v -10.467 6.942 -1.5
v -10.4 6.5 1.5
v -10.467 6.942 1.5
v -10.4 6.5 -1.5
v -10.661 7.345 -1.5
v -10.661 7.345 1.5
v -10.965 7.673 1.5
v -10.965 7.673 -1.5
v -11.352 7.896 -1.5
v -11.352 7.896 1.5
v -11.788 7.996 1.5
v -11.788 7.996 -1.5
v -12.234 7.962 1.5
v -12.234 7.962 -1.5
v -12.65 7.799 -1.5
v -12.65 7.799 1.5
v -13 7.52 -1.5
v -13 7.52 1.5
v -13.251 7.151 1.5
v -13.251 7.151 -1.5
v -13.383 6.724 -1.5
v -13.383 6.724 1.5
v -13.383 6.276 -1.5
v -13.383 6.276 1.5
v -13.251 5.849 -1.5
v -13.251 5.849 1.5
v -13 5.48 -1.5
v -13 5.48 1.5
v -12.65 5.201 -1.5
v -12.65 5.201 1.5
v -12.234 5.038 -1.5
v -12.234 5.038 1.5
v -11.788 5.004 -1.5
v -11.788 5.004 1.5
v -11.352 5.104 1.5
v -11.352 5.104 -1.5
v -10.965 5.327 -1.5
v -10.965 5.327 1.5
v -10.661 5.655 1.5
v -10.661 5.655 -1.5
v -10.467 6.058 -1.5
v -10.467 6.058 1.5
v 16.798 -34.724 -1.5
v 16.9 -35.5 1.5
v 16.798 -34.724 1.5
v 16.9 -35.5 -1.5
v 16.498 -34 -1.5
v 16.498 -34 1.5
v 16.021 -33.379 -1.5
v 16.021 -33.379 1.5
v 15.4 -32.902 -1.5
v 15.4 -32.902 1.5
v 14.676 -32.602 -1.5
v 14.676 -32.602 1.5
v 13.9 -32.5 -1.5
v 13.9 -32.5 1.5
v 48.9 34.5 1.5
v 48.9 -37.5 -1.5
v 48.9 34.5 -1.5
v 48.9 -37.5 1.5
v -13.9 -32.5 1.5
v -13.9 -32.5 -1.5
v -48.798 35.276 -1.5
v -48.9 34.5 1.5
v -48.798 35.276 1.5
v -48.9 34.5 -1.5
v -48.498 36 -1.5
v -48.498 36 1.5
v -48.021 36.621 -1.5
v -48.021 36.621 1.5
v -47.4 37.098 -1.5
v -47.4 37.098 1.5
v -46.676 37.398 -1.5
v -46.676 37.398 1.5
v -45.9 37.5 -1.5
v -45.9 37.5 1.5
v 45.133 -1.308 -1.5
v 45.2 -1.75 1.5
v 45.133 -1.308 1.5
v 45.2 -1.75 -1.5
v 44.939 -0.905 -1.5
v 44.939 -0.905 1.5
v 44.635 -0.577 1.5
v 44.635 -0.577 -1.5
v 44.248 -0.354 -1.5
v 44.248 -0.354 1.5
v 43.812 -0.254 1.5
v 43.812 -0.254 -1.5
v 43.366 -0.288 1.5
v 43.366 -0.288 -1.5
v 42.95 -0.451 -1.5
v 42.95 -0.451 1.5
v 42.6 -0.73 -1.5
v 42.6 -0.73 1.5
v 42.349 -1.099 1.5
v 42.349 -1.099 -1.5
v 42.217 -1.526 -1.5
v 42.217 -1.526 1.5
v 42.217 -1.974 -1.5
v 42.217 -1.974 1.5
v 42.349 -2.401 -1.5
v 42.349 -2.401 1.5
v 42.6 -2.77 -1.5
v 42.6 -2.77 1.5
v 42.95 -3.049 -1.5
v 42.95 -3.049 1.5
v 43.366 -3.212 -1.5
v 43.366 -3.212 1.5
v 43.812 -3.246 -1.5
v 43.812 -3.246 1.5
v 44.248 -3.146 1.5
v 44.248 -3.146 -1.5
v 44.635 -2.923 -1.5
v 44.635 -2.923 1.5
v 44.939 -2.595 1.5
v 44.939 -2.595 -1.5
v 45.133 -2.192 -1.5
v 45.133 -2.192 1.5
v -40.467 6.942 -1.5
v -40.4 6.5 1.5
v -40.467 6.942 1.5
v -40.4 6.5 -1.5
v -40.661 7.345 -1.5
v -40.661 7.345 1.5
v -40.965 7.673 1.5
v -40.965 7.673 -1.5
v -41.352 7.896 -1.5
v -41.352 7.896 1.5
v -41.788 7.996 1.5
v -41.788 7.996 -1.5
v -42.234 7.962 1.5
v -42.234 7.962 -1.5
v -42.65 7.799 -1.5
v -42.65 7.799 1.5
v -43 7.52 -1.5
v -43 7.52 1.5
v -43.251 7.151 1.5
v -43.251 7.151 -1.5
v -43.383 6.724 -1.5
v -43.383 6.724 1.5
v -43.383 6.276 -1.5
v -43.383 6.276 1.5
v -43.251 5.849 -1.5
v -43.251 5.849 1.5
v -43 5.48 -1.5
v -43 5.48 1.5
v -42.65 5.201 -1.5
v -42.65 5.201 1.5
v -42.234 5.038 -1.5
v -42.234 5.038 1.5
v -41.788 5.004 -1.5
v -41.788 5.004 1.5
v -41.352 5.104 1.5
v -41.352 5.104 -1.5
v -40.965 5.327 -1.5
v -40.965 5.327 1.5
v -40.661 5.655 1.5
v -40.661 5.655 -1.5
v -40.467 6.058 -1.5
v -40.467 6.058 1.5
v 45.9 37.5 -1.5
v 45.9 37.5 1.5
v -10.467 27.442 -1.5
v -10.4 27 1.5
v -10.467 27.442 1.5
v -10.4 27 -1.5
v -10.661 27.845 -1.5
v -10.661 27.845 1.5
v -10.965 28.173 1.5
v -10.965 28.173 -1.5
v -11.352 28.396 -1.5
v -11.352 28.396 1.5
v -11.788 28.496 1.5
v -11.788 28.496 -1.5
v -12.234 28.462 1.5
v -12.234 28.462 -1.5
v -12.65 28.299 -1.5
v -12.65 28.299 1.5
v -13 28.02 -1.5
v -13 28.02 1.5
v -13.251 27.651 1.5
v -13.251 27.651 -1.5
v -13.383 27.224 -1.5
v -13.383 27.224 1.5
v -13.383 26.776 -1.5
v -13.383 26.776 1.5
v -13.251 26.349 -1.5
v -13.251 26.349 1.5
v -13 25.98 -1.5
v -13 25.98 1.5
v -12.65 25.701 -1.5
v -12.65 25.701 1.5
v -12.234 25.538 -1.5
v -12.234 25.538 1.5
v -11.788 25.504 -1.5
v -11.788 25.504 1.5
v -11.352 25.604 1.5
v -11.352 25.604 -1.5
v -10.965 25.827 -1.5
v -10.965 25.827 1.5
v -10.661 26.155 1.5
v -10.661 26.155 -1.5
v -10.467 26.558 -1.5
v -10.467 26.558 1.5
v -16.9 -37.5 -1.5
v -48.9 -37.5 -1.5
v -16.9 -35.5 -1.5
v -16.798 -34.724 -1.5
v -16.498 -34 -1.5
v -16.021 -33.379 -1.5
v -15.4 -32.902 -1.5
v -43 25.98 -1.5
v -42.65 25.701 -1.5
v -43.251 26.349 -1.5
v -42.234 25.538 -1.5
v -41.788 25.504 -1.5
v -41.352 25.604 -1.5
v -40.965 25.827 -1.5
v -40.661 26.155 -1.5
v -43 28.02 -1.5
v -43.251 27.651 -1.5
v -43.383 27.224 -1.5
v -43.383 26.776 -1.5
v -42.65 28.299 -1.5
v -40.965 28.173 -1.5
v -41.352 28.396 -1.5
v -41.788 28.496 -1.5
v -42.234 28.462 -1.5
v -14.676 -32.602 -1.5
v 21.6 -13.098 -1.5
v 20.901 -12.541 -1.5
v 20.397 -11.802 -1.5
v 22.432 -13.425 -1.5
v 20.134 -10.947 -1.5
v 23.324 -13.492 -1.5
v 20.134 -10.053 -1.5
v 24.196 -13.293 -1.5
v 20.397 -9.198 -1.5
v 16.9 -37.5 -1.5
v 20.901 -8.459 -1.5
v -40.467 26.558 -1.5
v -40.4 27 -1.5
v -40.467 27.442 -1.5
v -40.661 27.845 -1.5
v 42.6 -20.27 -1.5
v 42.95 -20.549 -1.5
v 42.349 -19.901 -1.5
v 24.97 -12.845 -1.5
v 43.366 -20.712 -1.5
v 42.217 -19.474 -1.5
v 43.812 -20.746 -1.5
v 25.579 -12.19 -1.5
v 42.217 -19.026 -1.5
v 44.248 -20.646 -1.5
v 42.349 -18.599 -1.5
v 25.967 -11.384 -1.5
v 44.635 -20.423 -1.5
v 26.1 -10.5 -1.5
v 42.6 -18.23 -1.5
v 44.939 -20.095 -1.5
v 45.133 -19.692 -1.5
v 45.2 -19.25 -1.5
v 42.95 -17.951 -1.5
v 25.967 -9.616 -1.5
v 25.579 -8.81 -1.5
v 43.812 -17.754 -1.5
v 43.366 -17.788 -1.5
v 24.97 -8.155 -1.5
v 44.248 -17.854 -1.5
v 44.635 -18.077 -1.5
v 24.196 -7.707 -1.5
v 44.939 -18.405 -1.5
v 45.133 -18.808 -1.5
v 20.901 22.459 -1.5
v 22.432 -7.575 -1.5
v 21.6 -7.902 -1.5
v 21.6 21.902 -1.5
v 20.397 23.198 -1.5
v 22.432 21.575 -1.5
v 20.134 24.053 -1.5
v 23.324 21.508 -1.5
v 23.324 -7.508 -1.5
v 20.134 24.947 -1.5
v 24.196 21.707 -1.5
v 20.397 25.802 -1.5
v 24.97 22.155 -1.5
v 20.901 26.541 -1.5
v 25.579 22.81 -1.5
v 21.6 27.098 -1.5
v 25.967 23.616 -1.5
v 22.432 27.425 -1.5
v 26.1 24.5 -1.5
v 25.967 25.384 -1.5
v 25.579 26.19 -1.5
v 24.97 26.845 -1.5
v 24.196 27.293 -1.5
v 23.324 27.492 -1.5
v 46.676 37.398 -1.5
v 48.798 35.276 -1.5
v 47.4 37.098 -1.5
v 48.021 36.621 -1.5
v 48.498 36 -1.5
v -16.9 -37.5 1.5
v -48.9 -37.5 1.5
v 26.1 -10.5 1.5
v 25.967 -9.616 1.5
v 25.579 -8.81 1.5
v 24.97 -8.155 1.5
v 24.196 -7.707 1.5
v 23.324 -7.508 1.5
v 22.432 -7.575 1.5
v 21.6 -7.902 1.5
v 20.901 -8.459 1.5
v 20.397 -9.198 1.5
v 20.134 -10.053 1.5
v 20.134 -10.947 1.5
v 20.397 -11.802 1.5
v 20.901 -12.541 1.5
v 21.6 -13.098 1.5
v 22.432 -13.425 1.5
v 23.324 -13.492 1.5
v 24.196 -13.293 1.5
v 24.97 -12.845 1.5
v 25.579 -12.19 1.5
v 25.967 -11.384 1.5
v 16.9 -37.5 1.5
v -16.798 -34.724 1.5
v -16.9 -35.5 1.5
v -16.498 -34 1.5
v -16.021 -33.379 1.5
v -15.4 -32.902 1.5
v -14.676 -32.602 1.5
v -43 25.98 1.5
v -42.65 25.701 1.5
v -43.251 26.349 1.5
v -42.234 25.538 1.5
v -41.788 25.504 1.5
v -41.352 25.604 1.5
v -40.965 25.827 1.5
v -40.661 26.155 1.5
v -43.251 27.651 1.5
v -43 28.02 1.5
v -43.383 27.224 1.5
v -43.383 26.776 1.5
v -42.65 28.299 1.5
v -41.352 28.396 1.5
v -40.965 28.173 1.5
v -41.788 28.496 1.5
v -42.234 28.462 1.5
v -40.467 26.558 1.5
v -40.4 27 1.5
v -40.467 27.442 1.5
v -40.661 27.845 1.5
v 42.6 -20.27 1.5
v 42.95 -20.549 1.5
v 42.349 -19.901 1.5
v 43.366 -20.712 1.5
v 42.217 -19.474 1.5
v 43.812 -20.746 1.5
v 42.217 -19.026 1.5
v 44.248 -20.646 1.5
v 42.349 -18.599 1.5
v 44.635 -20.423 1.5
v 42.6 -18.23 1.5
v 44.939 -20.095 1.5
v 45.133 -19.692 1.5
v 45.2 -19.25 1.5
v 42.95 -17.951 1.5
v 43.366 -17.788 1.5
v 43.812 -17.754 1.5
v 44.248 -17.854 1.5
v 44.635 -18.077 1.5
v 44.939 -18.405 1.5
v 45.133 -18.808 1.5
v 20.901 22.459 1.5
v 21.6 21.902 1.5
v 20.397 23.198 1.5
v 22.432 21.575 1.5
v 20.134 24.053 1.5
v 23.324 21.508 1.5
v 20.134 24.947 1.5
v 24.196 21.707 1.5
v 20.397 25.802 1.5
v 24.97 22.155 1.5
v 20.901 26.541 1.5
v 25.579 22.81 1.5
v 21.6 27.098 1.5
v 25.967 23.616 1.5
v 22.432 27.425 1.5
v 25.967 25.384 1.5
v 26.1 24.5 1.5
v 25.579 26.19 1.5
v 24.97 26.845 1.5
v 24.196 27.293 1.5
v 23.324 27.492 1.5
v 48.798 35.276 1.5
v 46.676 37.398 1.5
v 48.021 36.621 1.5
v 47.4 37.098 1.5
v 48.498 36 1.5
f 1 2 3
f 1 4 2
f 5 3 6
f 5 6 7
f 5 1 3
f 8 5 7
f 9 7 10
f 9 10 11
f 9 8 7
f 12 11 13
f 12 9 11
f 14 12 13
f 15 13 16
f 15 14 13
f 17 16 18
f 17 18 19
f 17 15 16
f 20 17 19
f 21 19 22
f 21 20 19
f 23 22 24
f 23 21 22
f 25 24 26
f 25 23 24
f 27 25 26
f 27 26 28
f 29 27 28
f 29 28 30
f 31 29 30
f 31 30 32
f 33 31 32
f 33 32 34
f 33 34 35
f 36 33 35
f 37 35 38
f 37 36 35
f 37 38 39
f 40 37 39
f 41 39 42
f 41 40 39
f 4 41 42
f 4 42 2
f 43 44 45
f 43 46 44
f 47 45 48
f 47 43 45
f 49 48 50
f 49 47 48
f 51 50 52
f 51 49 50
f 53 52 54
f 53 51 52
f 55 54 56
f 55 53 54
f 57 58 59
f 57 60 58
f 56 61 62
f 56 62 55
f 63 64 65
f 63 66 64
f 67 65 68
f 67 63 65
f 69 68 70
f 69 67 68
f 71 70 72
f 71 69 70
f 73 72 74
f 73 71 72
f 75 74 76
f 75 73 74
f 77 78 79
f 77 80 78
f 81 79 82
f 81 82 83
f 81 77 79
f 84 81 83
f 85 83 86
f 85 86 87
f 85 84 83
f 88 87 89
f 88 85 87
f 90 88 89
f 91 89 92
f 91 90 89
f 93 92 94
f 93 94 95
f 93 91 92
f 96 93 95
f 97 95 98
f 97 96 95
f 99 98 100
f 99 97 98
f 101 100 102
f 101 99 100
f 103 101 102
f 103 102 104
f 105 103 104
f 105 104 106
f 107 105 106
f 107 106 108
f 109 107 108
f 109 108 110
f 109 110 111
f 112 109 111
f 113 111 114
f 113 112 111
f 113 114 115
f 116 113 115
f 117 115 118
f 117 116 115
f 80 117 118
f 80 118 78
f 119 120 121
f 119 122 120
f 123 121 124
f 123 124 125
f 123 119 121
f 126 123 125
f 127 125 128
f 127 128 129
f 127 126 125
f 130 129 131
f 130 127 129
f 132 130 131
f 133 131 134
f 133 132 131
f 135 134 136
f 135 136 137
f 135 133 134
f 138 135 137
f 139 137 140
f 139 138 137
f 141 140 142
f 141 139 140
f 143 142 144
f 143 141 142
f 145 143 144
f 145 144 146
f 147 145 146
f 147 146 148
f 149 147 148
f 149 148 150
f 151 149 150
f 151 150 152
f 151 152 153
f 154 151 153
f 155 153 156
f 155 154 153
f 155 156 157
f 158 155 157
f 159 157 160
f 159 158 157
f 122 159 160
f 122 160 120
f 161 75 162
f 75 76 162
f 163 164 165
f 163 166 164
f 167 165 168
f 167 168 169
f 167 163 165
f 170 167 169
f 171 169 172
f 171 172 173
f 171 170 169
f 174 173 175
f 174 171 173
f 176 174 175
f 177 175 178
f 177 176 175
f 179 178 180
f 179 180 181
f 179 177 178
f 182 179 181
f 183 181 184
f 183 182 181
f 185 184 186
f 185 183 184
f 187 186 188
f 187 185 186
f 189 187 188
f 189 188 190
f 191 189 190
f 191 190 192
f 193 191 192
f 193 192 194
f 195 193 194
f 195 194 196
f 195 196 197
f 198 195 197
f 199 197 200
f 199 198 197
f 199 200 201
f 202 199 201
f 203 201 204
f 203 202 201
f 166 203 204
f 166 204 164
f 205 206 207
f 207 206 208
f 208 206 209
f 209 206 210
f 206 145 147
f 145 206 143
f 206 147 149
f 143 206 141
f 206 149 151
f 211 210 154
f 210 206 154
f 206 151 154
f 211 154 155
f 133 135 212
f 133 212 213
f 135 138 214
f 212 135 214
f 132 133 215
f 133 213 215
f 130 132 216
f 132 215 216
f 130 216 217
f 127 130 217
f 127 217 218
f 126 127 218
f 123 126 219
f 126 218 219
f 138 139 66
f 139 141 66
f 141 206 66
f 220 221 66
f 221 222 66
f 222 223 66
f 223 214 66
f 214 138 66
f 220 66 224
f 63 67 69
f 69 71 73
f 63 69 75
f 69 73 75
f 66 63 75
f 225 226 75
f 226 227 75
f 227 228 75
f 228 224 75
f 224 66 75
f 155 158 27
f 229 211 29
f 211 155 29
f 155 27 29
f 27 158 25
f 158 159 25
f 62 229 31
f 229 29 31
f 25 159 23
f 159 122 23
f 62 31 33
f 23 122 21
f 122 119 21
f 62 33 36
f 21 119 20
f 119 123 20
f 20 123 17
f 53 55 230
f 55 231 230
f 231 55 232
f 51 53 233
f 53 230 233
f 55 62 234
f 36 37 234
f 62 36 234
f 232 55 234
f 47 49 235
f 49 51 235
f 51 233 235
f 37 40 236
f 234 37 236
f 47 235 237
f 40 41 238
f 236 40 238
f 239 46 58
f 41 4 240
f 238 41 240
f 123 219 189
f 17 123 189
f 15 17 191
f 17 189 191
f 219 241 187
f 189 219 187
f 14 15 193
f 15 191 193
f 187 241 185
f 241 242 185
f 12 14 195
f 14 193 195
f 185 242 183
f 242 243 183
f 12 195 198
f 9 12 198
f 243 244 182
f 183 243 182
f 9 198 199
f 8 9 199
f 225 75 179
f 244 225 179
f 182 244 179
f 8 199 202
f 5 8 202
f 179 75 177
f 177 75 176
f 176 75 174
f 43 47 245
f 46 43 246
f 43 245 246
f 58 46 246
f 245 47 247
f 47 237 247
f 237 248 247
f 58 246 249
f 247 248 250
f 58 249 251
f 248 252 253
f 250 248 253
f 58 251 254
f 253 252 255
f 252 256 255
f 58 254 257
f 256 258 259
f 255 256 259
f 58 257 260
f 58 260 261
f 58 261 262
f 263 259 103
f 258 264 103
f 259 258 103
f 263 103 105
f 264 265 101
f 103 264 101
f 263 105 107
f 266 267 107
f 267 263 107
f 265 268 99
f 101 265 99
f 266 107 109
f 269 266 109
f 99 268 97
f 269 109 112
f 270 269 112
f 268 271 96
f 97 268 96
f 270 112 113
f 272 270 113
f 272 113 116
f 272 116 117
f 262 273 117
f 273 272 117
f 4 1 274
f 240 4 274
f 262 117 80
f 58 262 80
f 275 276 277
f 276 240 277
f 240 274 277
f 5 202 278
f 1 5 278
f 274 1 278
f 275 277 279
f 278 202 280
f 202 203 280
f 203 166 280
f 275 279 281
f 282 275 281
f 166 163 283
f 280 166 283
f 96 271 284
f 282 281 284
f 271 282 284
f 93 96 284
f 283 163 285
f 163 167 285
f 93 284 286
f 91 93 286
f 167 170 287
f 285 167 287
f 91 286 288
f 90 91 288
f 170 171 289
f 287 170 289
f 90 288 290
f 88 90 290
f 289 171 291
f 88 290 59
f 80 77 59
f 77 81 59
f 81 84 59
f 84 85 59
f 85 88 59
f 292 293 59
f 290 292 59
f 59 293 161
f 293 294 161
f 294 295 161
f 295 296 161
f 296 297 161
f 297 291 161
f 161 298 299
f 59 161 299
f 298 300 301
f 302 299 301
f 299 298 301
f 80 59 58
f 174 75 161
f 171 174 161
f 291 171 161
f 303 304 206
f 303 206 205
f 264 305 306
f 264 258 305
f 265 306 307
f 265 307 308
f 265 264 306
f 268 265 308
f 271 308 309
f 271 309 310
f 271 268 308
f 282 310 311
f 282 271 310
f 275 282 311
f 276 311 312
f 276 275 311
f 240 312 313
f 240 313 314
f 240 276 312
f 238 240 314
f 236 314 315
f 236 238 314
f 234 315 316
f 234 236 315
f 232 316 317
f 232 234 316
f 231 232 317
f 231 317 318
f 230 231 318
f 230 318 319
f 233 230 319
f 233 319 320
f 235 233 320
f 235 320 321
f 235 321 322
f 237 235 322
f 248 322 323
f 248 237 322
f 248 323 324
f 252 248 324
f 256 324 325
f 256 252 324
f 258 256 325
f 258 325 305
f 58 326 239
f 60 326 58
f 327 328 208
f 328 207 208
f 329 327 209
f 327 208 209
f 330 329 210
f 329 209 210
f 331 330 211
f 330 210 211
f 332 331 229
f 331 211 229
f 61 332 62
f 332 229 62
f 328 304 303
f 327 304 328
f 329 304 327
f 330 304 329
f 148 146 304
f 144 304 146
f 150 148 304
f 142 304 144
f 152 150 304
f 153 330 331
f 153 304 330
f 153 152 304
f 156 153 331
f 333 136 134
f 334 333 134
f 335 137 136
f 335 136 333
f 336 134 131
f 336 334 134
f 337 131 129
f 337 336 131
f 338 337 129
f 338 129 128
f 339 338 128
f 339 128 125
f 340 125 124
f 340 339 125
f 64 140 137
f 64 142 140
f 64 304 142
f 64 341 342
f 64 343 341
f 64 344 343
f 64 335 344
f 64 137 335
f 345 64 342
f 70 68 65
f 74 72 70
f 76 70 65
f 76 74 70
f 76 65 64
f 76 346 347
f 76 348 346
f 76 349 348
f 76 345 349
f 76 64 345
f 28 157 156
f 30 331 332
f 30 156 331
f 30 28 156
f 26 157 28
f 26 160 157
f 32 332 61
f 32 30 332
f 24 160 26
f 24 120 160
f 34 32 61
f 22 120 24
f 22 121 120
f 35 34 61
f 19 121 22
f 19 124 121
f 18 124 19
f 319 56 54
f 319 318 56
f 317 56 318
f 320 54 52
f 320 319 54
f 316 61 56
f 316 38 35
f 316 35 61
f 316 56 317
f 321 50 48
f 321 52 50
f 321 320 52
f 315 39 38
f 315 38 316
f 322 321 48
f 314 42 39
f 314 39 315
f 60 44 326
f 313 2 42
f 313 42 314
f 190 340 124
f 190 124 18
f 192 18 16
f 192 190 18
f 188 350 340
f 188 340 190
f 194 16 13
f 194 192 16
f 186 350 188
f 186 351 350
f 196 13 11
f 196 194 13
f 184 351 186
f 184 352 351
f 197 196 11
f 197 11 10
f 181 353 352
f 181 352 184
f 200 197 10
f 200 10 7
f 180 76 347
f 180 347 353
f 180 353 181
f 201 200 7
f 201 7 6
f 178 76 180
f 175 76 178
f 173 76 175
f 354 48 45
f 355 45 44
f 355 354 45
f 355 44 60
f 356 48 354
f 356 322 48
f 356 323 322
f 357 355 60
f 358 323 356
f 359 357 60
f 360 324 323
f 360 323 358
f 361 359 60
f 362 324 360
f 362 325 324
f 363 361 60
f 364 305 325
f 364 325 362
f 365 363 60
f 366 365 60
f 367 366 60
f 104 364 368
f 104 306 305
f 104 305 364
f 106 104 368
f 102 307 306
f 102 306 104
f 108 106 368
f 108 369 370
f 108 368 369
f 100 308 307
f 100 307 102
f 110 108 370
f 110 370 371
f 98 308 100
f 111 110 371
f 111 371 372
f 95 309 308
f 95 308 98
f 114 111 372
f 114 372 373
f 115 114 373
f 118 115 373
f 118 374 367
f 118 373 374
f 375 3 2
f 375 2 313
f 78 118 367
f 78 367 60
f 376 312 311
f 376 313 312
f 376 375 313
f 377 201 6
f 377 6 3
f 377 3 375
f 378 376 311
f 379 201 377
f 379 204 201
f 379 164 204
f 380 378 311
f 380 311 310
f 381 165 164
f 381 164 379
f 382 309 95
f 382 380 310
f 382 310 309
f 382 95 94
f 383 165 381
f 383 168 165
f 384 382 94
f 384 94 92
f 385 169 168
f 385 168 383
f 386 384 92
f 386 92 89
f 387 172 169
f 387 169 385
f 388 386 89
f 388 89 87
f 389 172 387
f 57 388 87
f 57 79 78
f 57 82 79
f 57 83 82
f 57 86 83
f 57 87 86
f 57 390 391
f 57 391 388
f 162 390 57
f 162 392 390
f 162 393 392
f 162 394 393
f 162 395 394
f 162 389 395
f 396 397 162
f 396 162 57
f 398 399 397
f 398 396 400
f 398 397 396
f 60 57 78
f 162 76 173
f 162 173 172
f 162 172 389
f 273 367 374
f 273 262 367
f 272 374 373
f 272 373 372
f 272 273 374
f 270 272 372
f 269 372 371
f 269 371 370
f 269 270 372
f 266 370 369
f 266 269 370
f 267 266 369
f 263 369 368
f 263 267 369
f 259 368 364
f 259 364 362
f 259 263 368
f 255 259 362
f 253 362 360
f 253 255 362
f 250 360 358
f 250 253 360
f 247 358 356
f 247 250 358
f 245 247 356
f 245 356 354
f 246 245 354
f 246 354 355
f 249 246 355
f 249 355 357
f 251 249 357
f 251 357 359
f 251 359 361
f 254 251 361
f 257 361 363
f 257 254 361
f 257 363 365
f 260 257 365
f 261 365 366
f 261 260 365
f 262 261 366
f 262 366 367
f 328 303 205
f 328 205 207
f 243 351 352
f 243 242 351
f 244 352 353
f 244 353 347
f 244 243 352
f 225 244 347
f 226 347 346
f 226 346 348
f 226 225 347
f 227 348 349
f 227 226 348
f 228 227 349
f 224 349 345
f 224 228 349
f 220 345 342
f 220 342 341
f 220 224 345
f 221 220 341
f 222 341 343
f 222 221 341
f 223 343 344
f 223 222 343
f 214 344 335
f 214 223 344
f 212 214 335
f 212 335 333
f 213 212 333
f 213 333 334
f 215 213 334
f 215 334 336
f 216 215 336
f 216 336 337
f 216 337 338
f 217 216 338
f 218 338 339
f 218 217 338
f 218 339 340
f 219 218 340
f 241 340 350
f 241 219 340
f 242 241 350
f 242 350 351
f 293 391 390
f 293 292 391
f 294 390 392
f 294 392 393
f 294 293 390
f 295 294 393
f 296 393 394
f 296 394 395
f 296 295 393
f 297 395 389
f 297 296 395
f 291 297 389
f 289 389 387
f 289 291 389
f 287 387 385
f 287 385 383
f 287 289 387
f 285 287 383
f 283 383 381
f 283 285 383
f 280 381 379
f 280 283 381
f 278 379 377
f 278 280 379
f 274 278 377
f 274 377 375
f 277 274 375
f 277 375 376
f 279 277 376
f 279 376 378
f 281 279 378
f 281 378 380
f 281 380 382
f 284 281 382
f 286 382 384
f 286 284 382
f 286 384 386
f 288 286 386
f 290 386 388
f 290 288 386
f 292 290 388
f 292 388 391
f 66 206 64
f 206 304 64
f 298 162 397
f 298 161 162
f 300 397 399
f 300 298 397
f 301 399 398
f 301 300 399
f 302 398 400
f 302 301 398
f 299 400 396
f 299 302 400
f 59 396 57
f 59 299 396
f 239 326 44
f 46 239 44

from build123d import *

# Parameters (mm, degrees)
CROQUIS1_W              = 97.8
CROQUIS1_H              = 75
CROQUIS1_R              = 1.5
CROQUIS1_R_2            = 3
SALIENTE_EXTRUIR1_DEPTH = 1.5
CROQUIS2_W              = 33.8
CROQUIS2_H              = 5
CORTAR_EXTRUIR1_DEPTH   = 62.696515299
REDONDEO1_R             = 3


with BuildPart() as part:
    # Croquis1 → Saliente-Extruir1 (new, symmetric)
    with BuildSketch(Plane.XY):
        Rectangle(CROQUIS1_W, CROQUIS1_H)
        with Locations((-41.9, 27)):
            Circle(CROQUIS1_R, mode=Mode.SUBTRACT)
        with Locations((-11.9, 27)):
            Circle(CROQUIS1_R, mode=Mode.SUBTRACT)
        with Locations((-11.9, 6.5)):
            Circle(CROQUIS1_R, mode=Mode.SUBTRACT)
        with Locations((-41.9, 6.5)):
            Circle(CROQUIS1_R, mode=Mode.SUBTRACT)
        with Locations((23.1, -10.5)):
            Circle(CROQUIS1_R_2, mode=Mode.SUBTRACT)
        with Locations((23.1, 24.5)):
            Circle(CROQUIS1_R_2, mode=Mode.SUBTRACT)
        with Locations((43.7, -1.75)):
            Circle(CROQUIS1_R, mode=Mode.SUBTRACT)
        with Locations((43.7, -19.25)):
            Circle(CROQUIS1_R, mode=Mode.SUBTRACT)
    extrude(amount=SALIENTE_EXTRUIR1_DEPTH, both=True)

    # Croquis2 → Cortar-Extruir1 (cut, through all)
    with BuildSketch(Plane.XY.offset(1.5)):
        with Locations((0, -35)):
            Rectangle(CROQUIS2_W, CROQUIS2_H)
    extrude(amount=-CORTAR_EXTRUIR1_DEPTH, mode=Mode.SUBTRACT)

    # Redondeo1
    redondeo1_edges = [part.edges().sort_by_distance(p)[0] for p in [
        (16.9, -32.5, 0),
        (-16.9, -32.5, 0),
        (-48.9, 37.5, 0),
        (48.9, 37.5, 0),
    ]]
    fillet(redondeo1_edges, radius=REDONDEO1_R)


solid = part.part
